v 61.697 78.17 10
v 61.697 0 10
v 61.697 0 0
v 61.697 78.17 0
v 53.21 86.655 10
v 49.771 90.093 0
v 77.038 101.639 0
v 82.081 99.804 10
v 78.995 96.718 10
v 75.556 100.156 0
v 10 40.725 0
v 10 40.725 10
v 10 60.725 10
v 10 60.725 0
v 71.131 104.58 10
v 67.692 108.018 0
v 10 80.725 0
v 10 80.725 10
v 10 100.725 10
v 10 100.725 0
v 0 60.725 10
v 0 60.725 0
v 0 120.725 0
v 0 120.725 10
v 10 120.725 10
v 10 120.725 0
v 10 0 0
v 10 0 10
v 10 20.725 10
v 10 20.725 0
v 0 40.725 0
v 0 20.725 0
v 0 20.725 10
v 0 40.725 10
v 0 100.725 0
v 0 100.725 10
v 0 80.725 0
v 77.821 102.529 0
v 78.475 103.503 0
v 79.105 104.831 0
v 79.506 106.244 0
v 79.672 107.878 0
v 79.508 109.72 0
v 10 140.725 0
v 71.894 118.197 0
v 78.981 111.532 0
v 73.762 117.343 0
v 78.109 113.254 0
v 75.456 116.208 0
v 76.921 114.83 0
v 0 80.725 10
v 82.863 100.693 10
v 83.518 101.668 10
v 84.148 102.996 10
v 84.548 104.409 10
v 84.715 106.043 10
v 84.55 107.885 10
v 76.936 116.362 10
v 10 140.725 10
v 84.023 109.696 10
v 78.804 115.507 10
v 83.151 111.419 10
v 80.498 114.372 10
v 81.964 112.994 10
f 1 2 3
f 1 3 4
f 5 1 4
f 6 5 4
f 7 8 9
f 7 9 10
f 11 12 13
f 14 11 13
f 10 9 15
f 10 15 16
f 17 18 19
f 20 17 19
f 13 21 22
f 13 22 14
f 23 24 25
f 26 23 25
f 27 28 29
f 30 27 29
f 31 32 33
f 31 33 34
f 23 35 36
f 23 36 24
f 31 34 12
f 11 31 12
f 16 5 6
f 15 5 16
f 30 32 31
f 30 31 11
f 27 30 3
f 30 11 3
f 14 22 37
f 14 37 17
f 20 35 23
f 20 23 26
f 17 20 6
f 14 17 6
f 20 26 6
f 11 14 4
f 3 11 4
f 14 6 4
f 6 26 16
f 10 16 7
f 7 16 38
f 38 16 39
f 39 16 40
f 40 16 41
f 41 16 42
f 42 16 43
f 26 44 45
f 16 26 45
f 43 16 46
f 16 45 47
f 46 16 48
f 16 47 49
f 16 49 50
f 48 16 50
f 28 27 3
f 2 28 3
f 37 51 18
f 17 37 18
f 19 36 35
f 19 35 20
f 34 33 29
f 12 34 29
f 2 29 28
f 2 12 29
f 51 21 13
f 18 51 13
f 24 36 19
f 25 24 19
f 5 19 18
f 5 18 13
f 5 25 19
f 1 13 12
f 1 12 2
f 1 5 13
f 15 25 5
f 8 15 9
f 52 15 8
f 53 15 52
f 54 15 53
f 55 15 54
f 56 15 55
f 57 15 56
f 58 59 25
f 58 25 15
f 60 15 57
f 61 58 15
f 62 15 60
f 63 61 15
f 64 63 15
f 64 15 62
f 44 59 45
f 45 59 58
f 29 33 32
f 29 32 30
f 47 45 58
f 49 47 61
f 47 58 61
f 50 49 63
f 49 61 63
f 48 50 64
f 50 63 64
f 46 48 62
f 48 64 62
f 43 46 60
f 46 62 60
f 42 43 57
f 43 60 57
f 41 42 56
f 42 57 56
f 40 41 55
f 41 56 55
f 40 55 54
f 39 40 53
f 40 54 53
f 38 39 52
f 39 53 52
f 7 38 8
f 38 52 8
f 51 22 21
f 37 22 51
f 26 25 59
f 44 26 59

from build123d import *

# Parameters (mm, degrees)
SKETCH1_W           = 119.144328959
SKETCH1_H           = 140.724589222
BOSS_EXTRUDE1_DEPTH = 10
SKETCH2_W           = 10
SKETCH2_H           = 20
SKETCH2_H_2         = 20.724589222
CUT_EXTRUDE1_DEPTH  = 10
CUT_EXTRUDE2_DEPTH  = 10
CUT_EXTRUDE6_DEPTH  = 150
CUT_EXTRUDE7_REACH  = 169.502
SKETCH9_W           = 10
SKETCH9_H           = 25.346761212
SKETCH10_W          = 31.040737262
SKETCH10_H          = 31.620202264
CUT_EXTRUDE8_DEPTH  = 150
FILLET1_R           = 10


with BuildPart() as part:
    # Sketch1 → Boss-Extrude1 (new body)
    with BuildSketch(Plane.XY):
        with Locations((59.57216448, 70.362294611)):
            Rectangle(SKETCH1_W, SKETCH1_H)
    extrude(amount=BOSS_EXTRUDE1_DEPTH)

    # Sketch2 → Cut-Extrude1 (cut)
    with BuildSketch(Plane.XY.offset(10)):
        with Locations((5, 50.724589222)):
            Rectangle(SKETCH2_W, SKETCH2_H)
        with Locations((5, 90.724589222)):
            Rectangle(SKETCH2_W, SKETCH2_H)
        with Locations((5, 10.362294611)):
            Rectangle(SKETCH2_W, SKETCH2_H_2)
        with Locations((5, 130.724589222)):
            Rectangle(SKETCH2_W, SKETCH2_H)
    extrude(amount=-CUT_EXTRUDE1_DEPTH, mode=Mode.SUBTRACT)

    # Sketch4 → Cut-Extrude2 (cut)
    with BuildSketch(Plane.XY.offset(10)):
        Polygon((10, 140.724589222), (119.144328959, 100.999302242), (119.144328959, 140.724589222), align=None)
    extrude(amount=-CUT_EXTRUDE2_DEPTH, mode=Mode.SUBTRACT)

    # Sketch7 → Cut-Extrude6 (cut)
    with BuildSketch(Plane.XY.offset(10)):
        Polygon((76.127978338, 92.605170498), (93.75776849, 110.239254603), (119.144328959, 100.999302242), (119.144328959, 0), (61.696670809, 0), (61.696670809, 78.170348045), align=None)
    extrude(amount=-CUT_EXTRUDE6_DEPTH, mode=Mode.SUBTRACT)

    # Cut-Extrude7: up to this plane
    cut_extrude7_end = Plane(origin=(241.768645896, -65.518758289, 505.407022073), z_dir=(0.6359690231741637, -0.635814162767, -0.4373599798653267))
    # Sketch9 → Cut-Extrude7 (cut, up to the surface)
    with BuildSketch(Plane(origin=(-8.22932488, 8.227321014, 0), x_dir=(0, 0, -1), z_dir=(0.7071928777614668, -0.7070206741273237, 0)), mode=Mode.PRIVATE) as cut_extrude7_sk1:
        with Locations((-5, 111.575715782)):
            Rectangle(SKETCH9_W, SKETCH9_H)
    cut_extrude7_tool1 = split(extrude(cut_extrude7_sk1.sketch, amount=-CUT_EXTRUDE7_REACH, mode=Mode.PRIVATE), bisect_by=cut_extrude7_end, keep=Keep.BOTH, mode=Mode.PRIVATE)
    add(cut_extrude7_tool1.solids().sort_by_distance((70.657013, 87.132873, 5))[0], mode=Mode.SUBTRACT)

    # Sketch10 → Cut-Extrude8 (cut)
    with BuildSketch(Plane(origin=(-9.939992949, 9.937572531, 6.835796961), x_dir=(-0.30929786277865773, 0.30922254780069597, -0.8992865216449099), z_dir=(0.6359690231741634, -0.6358141627670002, -0.4373599798653268))):
        with Locations((3.372258752, 133.362557089)):
            Rectangle(SKETCH10_W, SKETCH10_H)
    extrude(amount=CUT_EXTRUDE8_DEPTH, mode=Mode.SUBTRACT)

    # Fillet1
    fillet1_edges = [part.edges().sort_by_distance(p)[0] for p in [
        (90.324191509, 111.488974422, 5),
    ]]
    fillet(fillet1_edges, radius=FILLET1_R)


solid = part.part
